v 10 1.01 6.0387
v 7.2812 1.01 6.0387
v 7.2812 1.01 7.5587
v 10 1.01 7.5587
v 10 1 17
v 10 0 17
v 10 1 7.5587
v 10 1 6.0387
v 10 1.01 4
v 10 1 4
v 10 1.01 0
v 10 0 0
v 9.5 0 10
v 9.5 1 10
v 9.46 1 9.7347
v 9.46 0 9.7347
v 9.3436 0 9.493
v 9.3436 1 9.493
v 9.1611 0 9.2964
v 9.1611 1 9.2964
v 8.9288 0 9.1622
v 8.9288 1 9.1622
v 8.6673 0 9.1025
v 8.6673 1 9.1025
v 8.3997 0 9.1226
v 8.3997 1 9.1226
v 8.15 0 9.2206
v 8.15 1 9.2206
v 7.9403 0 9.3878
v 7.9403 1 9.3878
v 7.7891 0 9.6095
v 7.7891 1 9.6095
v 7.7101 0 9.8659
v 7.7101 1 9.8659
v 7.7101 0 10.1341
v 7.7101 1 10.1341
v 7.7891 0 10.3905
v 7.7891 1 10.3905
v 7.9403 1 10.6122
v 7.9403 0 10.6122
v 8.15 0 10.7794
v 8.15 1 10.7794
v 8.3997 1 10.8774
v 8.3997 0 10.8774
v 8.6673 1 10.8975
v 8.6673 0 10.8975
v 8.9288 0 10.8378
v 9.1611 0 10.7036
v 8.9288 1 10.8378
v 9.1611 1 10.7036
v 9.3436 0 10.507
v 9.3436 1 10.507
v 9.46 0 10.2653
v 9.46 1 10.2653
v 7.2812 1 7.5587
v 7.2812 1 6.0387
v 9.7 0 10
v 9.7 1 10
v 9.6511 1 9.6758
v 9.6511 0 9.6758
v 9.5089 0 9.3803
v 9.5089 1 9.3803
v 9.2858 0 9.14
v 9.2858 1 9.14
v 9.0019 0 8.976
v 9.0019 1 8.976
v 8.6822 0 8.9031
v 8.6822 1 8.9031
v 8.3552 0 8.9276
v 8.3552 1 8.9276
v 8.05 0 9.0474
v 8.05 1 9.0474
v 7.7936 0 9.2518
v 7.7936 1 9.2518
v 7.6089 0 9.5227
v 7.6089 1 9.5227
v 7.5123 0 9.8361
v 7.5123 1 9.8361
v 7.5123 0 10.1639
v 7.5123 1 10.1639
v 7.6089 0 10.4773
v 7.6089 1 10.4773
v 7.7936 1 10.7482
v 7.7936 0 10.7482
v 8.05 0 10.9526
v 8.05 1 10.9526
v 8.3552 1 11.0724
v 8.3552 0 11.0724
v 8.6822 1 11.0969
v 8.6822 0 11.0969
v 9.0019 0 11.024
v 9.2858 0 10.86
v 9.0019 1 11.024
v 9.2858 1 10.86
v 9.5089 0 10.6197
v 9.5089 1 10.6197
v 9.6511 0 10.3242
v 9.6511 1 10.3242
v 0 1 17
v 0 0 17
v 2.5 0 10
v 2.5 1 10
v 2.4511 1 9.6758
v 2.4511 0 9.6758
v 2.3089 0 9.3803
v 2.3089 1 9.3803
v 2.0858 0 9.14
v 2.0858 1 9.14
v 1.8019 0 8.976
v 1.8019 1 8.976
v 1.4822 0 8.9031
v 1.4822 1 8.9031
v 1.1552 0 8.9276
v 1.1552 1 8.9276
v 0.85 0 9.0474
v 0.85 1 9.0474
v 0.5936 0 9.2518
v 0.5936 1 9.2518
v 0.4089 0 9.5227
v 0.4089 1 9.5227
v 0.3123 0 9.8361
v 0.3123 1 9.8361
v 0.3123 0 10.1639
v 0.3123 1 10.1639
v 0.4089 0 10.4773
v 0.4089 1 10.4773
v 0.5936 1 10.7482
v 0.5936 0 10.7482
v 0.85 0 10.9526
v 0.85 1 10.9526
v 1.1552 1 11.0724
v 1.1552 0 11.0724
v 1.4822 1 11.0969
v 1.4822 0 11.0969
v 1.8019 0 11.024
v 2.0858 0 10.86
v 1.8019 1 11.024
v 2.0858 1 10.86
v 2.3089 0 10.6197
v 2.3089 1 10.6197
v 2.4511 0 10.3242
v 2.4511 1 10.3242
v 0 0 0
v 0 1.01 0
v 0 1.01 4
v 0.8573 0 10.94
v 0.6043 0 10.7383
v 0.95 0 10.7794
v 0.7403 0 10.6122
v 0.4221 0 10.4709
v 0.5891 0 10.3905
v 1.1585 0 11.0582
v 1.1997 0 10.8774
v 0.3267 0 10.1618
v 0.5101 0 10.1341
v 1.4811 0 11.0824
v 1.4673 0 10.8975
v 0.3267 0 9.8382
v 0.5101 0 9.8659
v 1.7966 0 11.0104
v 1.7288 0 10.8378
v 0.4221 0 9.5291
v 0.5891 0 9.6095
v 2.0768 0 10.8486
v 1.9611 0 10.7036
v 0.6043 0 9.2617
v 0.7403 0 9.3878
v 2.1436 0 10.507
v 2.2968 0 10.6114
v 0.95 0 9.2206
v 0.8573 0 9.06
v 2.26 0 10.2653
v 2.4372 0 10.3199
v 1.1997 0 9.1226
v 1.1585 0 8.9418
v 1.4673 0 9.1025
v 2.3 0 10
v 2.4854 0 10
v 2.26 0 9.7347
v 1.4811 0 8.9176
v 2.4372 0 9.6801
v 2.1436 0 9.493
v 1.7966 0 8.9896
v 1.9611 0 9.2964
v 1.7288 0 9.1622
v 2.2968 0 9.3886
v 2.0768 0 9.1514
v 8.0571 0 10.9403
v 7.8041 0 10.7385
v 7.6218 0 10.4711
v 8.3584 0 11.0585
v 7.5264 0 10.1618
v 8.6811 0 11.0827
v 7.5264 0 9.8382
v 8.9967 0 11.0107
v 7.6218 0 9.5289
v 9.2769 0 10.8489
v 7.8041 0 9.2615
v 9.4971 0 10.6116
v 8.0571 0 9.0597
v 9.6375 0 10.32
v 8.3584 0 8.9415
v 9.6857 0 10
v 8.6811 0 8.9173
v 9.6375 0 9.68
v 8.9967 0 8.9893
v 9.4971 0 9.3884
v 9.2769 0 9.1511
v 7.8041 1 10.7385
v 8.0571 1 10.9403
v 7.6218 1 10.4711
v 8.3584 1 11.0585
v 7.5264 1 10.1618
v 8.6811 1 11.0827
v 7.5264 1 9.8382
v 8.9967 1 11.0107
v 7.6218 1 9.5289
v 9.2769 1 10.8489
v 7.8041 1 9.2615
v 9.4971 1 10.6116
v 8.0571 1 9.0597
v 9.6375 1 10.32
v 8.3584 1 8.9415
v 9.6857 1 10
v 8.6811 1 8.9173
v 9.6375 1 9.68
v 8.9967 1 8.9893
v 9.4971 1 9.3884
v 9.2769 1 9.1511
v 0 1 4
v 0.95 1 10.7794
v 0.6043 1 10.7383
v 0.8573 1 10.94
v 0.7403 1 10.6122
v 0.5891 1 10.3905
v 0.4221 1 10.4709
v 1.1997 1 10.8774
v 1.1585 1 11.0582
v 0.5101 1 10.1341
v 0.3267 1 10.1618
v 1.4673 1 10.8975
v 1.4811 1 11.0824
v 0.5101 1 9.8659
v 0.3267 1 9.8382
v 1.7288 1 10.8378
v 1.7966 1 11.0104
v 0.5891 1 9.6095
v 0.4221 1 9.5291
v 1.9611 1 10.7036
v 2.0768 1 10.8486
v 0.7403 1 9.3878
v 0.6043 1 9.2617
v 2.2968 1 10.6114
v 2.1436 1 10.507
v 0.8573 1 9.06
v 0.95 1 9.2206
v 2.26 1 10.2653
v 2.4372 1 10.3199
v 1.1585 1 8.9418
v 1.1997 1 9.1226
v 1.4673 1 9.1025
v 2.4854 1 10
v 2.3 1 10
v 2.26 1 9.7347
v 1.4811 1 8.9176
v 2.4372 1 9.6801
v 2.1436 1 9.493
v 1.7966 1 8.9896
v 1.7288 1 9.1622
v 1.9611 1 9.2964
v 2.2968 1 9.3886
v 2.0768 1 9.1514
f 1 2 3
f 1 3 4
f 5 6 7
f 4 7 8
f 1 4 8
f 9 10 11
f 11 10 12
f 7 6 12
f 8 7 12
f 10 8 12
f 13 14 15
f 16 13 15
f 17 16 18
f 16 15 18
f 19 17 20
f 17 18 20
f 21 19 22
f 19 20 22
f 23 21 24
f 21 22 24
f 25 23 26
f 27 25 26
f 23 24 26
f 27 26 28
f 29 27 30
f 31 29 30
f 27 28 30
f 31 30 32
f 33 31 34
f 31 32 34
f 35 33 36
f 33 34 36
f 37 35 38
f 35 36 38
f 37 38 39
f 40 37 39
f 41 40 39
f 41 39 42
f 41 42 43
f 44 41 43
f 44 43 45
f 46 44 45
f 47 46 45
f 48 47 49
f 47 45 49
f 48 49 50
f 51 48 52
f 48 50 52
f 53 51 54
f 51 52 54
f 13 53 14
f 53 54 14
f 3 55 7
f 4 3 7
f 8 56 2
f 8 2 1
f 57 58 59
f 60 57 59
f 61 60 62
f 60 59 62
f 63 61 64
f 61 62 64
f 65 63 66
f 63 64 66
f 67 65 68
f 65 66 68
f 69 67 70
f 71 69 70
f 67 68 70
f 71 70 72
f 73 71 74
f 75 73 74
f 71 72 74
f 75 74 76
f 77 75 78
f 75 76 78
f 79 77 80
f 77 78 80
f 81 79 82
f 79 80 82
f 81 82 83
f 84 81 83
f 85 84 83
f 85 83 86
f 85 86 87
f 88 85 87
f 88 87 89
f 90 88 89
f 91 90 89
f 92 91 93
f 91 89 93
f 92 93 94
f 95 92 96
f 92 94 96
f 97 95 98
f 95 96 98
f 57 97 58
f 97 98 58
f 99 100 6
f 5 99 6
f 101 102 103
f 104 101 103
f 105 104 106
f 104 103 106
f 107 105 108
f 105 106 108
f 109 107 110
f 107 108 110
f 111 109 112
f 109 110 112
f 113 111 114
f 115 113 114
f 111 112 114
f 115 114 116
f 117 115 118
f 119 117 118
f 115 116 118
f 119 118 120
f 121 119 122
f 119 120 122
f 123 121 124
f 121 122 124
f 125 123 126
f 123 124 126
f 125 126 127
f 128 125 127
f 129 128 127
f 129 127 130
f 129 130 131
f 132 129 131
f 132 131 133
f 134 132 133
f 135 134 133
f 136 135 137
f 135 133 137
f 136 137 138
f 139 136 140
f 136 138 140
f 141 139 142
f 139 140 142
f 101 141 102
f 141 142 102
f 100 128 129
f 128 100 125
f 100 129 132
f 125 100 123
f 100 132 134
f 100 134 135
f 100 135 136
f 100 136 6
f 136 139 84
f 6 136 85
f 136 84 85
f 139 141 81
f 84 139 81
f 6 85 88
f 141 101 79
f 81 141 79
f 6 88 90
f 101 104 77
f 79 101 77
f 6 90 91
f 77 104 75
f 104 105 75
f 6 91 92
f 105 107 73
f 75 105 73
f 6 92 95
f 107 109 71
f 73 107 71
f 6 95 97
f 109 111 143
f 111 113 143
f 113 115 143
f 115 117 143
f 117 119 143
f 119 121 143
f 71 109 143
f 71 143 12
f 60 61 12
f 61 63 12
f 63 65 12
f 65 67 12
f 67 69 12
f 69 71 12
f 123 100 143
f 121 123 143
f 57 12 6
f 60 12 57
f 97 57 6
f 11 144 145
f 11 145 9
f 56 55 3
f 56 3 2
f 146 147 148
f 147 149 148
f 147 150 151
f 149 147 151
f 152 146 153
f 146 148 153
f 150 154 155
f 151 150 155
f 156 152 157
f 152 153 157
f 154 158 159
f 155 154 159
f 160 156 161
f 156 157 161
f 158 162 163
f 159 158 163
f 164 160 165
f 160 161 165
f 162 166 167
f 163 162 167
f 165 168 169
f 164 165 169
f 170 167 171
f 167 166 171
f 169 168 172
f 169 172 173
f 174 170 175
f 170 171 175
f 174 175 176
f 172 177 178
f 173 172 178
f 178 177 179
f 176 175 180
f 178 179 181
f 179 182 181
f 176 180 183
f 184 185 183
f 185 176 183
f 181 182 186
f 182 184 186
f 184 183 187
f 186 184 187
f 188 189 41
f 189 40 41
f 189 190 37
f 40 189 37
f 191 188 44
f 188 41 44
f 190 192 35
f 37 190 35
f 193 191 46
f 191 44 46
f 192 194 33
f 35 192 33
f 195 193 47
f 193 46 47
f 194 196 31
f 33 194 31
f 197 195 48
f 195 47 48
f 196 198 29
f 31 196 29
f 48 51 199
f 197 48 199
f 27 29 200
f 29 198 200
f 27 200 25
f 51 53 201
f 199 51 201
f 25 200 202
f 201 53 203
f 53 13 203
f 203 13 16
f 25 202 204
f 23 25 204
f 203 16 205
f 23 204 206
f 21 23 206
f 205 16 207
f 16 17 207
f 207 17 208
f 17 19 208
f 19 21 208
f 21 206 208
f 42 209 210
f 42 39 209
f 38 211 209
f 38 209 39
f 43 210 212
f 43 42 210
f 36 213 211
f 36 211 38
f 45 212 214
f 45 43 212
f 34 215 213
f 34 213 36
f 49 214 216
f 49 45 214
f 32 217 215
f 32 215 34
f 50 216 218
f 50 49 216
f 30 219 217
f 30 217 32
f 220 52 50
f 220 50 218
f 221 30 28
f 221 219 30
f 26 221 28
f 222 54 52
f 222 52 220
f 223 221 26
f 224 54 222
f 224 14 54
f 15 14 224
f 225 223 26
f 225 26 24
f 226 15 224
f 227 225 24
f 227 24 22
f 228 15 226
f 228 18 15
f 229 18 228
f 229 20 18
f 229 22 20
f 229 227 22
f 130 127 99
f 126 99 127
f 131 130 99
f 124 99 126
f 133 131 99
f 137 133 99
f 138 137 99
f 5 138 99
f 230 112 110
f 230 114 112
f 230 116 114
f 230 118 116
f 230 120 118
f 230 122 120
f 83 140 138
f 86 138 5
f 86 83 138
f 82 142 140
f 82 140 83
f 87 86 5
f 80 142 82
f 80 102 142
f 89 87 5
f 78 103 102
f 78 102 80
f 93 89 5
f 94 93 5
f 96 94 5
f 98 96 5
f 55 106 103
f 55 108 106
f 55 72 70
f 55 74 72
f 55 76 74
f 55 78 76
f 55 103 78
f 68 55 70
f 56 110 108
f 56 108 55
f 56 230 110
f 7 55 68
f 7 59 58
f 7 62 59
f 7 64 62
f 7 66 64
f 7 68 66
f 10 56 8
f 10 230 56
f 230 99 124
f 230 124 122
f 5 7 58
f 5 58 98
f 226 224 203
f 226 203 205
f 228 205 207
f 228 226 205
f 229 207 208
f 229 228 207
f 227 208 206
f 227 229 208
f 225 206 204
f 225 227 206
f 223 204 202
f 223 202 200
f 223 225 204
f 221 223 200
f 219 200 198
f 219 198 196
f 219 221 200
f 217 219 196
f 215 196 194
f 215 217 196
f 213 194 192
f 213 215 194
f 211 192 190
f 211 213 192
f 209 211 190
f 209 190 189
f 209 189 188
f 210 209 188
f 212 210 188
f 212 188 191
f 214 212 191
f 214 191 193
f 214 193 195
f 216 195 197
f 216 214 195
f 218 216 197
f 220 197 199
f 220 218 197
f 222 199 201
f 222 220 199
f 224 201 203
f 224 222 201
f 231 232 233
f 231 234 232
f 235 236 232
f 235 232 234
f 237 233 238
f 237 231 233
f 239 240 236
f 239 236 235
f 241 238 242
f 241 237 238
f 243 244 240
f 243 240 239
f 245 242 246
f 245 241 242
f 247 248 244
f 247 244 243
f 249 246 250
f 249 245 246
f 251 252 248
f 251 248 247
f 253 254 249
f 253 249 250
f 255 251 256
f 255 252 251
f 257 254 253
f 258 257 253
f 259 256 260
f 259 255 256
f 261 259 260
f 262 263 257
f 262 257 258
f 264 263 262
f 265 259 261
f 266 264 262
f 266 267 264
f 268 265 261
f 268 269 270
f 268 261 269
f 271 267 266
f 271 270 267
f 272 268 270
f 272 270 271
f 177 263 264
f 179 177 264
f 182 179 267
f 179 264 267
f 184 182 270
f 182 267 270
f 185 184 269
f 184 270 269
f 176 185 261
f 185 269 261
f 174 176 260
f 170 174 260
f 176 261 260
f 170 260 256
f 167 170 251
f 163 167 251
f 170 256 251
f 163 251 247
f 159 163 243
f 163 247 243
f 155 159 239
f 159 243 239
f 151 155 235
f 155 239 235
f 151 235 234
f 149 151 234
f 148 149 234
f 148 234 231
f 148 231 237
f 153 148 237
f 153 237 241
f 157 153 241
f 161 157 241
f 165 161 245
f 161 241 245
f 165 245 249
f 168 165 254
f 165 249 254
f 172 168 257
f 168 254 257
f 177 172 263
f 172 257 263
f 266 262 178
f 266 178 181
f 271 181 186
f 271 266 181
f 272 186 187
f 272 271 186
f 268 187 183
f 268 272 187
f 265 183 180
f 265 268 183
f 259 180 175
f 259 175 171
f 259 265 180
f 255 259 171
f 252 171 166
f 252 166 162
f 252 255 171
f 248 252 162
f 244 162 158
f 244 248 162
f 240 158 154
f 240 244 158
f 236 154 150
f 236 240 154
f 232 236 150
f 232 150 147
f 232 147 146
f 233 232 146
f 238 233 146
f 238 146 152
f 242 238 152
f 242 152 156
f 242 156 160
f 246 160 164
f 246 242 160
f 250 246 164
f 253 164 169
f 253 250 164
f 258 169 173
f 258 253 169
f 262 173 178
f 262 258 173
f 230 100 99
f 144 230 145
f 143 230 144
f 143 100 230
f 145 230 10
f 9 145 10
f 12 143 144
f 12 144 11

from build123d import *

# Parameters (mm, degrees)
SKETCH_3_W          = 10
SKETCH_3_H          = 17
EXTRUDE_2_DEPTH     = 1
SKETCH_4_R          = 1.1
CUT_EXTRUDE_1_DEPTH = 1
SKETCH_7_R          = 1.085736063
SKETCH_7_R_2        = 0.9
EXTRUDE_3_DEPTH     = 1
SKETCH_7_R_3        = 1.085426327
EXTRUDE_3_2_DEPTH   = 1
SKETCH_8_W          = 10
SKETCH_8_H          = 4
EXTRUDE_4_DEPTH     = 0.01
SKETCH_9_W          = 2.718788434
SKETCH_9_H          = 1.519981135
EXTRUDE_5_DEPTH     = 0.01


with BuildPart() as part:
    # 草图3 → 凸台-拉伸2 (new body)
    with BuildSketch(Plane(origin=(0, 0, 0), x_dir=(1, 0, 0), z_dir=(0, 1, 0))):
        with Locations((5, -8.5)):
            Rectangle(SKETCH_3_W, SKETCH_3_H)
    extrude(amount=EXTRUDE_2_DEPTH)

    # 草图4 → 切除-拉伸1 (cut)
    with BuildSketch(Plane(origin=(0, 1, 0), x_dir=(1, 0, 0), z_dir=(0, 1, 0))):
        with Locations((1.4, -10)):
            Circle(SKETCH_4_R)
        with Locations((8.6, -10)):
            Circle(SKETCH_4_R)
    extrude(amount=-CUT_EXTRUDE_1_DEPTH, mode=Mode.SUBTRACT)

    # 草图8 → 凸台-拉伸4 (add)
    with BuildSketch(Plane(origin=(0, 1, 0), x_dir=(1, 0, 0), z_dir=(0, 1, 0))):
        with Locations((5, -2)):
            Rectangle(SKETCH_8_W, SKETCH_8_H)
    extrude(amount=EXTRUDE_4_DEPTH)

    # 草图9 → 凸台-拉伸5 (add)
    with BuildSketch(Plane(origin=(0, 1, 0), x_dir=(1, 0, 0), z_dir=(0, 1, 0))):
        with Locations((8.640605783, -6.798698645)):
            Rectangle(SKETCH_9_W, SKETCH_9_H)
    extrude(amount=EXTRUDE_5_DEPTH)


with BuildPart() as body_2:
    # 草图7 → 凸台-拉伸3 (new body)
    with BuildSketch(Plane(origin=(0, 1, 0), x_dir=(1, 0, 0), z_dir=(0, 1, 0))):
        with Locations((8.6, -10)):
            Circle(SKETCH_7_R)
        with Locations((8.6, -10)):
            Circle(SKETCH_7_R_2, mode=Mode.SUBTRACT)
    extrude(amount=-EXTRUDE_3_DEPTH)


with BuildPart() as body_3:
    # 草图7 → Extrude 3 2 (new body)
    with BuildSketch(Plane(origin=(0, 1, 0), x_dir=(1, 0, 0), z_dir=(0, 1, 0))):
        with Locations((1.4, -10)):
            Circle(SKETCH_7_R_3)
        with Locations((1.4, -10)):
            Circle(SKETCH_7_R_2, mode=Mode.SUBTRACT)
    extrude(amount=-EXTRUDE_3_2_DEPTH)


solid = Compound([part.part, body_2.part, body_3.part])
